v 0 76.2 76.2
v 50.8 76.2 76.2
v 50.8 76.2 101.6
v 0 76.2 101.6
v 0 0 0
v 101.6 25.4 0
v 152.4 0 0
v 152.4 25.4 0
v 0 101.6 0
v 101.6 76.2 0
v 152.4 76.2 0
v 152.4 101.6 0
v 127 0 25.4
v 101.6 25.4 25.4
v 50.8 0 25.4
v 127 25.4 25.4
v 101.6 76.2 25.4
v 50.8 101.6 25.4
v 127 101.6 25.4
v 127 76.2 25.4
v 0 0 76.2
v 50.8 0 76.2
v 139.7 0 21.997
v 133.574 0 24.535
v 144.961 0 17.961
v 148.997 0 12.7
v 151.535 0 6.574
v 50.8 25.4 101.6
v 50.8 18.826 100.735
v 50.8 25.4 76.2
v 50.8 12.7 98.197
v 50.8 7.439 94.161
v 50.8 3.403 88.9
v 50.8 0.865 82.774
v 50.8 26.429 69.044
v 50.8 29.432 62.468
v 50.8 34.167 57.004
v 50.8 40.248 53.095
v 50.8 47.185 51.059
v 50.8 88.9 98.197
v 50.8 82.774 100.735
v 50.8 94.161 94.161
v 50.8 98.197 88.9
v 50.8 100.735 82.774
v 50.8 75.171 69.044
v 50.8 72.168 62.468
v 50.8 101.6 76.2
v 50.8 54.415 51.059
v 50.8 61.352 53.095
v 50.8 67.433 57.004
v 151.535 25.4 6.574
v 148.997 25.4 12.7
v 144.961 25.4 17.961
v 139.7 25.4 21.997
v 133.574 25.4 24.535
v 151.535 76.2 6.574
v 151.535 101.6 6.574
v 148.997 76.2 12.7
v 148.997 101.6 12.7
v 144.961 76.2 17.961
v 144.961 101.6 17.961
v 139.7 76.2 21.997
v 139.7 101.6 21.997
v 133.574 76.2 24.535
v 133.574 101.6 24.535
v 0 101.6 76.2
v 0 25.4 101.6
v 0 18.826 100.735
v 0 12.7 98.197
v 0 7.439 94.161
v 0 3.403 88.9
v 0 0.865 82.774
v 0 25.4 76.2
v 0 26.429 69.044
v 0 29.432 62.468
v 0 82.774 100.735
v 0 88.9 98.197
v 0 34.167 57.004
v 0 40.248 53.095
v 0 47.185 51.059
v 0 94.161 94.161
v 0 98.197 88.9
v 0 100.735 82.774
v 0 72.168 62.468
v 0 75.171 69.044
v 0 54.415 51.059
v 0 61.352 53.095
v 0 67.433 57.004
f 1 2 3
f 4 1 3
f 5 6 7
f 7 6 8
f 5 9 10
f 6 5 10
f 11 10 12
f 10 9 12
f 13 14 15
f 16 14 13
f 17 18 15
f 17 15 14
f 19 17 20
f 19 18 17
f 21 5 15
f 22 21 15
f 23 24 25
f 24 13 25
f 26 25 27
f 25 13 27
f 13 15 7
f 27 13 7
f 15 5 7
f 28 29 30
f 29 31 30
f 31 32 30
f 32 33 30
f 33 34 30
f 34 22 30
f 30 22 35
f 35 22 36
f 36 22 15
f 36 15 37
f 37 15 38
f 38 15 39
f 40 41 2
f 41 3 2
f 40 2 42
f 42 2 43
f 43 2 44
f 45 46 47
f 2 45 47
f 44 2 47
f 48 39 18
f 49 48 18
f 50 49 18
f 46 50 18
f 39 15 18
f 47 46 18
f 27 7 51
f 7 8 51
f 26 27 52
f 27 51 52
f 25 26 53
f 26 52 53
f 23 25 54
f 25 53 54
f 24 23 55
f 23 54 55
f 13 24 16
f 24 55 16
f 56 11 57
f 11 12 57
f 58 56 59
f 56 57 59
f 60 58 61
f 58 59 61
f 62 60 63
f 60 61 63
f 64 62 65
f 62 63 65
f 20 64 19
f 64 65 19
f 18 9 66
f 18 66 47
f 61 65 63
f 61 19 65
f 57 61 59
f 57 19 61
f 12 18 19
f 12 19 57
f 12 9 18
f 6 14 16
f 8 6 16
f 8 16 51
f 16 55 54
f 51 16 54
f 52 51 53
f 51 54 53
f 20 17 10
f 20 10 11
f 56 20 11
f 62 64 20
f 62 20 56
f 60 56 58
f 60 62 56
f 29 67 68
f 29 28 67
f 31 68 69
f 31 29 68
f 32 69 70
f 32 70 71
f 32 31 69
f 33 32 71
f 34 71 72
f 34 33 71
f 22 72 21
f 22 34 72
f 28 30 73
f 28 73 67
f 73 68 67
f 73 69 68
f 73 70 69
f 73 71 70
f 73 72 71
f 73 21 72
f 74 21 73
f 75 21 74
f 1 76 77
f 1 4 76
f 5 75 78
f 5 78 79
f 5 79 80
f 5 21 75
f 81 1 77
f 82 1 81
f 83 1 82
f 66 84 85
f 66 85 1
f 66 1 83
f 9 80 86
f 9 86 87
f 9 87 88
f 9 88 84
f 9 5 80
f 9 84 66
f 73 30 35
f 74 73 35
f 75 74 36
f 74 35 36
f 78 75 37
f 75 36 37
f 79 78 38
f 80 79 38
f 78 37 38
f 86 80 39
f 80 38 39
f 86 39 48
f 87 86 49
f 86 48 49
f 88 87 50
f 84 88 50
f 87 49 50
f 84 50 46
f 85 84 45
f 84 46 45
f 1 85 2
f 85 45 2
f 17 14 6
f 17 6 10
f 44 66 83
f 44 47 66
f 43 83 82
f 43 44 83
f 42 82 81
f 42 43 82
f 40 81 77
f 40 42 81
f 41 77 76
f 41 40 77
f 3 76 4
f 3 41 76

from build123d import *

# Parameters (mm, degrees)
F0_W     = 152.4
F0_H     = 101.6
F1_DEPTH = 25.4
F2_W     = 50.8
F2_H     = 50.8
F3_DEPTH = 25.401
F4_W     = 50.8
F4_H     = 101.6
F5_DEPTH = 76.2
F6_W     = 50.8
F6_H     = 25.4
F7_DEPTH = 50.801
F9_DEPTH = 50.801
F10_R    = 25.39999


# Not quite as in the source:
# - a fillet or chamfer is up to 0.001 mm smaller than in the source, because OpenCascade refuses the exact size


with BuildPart() as f1:
    # F0 (on Top) → F1 (new body)
    with BuildSketch(Plane.XY):
        with Locations((76.2, 50.8)):
            Rectangle(F0_W, F0_H)
    extrude(amount=F1_DEPTH)

    # F2 (on face) → F3 (cut, through all)
    with BuildSketch(Plane.XY.offset(25.4)):
        with Locations((127, 50.8)):
            Rectangle(F2_W, F2_H)
    extrude(amount=-F3_DEPTH, mode=Mode.SUBTRACT)

    # F4 (on face) → F5 (join)
    with BuildSketch(Plane.XY.offset(25.4)):
        with Locations((25.4, 50.8)):
            Rectangle(F4_W, F4_H)
    extrude(amount=F5_DEPTH)

    # F6 (on face) → F7 (cut, through all)
    with BuildSketch(Plane.YZ.offset(50.8)):
        with Locations((50.8, 88.9)):
            Rectangle(F6_W, F6_H)
    extrude(amount=-F7_DEPTH, mode=Mode.SUBTRACT)

    # F8 (on face) → F9 (cut, through all)
    with BuildSketch(Plane.YZ.offset(50.8)):
        with BuildLine():
            Line((76.2, 76.2), (25.4, 76.2))
            ThreePointArc((25.4, 76.2), (50.8, 50.8), (76.2, 76.2))
        make_face()
    extrude(amount=-F9_DEPTH, mode=Mode.SUBTRACT)

    # F10 (radius 25.4 in the source; OpenCascade refuses exactly that, so slightly less here)
    f10_edges = [f1.edges().sort_by_distance(p)[0] for p in [
        (25.4, 0, 101.6),
        (25.4, 101.6, 101.6),
        (152.4, 12.7, 25.4),
        (152.4, 88.9, 25.4),
    ]]
    fillet(f10_edges, radius=F10_R)


solid = f1.part
